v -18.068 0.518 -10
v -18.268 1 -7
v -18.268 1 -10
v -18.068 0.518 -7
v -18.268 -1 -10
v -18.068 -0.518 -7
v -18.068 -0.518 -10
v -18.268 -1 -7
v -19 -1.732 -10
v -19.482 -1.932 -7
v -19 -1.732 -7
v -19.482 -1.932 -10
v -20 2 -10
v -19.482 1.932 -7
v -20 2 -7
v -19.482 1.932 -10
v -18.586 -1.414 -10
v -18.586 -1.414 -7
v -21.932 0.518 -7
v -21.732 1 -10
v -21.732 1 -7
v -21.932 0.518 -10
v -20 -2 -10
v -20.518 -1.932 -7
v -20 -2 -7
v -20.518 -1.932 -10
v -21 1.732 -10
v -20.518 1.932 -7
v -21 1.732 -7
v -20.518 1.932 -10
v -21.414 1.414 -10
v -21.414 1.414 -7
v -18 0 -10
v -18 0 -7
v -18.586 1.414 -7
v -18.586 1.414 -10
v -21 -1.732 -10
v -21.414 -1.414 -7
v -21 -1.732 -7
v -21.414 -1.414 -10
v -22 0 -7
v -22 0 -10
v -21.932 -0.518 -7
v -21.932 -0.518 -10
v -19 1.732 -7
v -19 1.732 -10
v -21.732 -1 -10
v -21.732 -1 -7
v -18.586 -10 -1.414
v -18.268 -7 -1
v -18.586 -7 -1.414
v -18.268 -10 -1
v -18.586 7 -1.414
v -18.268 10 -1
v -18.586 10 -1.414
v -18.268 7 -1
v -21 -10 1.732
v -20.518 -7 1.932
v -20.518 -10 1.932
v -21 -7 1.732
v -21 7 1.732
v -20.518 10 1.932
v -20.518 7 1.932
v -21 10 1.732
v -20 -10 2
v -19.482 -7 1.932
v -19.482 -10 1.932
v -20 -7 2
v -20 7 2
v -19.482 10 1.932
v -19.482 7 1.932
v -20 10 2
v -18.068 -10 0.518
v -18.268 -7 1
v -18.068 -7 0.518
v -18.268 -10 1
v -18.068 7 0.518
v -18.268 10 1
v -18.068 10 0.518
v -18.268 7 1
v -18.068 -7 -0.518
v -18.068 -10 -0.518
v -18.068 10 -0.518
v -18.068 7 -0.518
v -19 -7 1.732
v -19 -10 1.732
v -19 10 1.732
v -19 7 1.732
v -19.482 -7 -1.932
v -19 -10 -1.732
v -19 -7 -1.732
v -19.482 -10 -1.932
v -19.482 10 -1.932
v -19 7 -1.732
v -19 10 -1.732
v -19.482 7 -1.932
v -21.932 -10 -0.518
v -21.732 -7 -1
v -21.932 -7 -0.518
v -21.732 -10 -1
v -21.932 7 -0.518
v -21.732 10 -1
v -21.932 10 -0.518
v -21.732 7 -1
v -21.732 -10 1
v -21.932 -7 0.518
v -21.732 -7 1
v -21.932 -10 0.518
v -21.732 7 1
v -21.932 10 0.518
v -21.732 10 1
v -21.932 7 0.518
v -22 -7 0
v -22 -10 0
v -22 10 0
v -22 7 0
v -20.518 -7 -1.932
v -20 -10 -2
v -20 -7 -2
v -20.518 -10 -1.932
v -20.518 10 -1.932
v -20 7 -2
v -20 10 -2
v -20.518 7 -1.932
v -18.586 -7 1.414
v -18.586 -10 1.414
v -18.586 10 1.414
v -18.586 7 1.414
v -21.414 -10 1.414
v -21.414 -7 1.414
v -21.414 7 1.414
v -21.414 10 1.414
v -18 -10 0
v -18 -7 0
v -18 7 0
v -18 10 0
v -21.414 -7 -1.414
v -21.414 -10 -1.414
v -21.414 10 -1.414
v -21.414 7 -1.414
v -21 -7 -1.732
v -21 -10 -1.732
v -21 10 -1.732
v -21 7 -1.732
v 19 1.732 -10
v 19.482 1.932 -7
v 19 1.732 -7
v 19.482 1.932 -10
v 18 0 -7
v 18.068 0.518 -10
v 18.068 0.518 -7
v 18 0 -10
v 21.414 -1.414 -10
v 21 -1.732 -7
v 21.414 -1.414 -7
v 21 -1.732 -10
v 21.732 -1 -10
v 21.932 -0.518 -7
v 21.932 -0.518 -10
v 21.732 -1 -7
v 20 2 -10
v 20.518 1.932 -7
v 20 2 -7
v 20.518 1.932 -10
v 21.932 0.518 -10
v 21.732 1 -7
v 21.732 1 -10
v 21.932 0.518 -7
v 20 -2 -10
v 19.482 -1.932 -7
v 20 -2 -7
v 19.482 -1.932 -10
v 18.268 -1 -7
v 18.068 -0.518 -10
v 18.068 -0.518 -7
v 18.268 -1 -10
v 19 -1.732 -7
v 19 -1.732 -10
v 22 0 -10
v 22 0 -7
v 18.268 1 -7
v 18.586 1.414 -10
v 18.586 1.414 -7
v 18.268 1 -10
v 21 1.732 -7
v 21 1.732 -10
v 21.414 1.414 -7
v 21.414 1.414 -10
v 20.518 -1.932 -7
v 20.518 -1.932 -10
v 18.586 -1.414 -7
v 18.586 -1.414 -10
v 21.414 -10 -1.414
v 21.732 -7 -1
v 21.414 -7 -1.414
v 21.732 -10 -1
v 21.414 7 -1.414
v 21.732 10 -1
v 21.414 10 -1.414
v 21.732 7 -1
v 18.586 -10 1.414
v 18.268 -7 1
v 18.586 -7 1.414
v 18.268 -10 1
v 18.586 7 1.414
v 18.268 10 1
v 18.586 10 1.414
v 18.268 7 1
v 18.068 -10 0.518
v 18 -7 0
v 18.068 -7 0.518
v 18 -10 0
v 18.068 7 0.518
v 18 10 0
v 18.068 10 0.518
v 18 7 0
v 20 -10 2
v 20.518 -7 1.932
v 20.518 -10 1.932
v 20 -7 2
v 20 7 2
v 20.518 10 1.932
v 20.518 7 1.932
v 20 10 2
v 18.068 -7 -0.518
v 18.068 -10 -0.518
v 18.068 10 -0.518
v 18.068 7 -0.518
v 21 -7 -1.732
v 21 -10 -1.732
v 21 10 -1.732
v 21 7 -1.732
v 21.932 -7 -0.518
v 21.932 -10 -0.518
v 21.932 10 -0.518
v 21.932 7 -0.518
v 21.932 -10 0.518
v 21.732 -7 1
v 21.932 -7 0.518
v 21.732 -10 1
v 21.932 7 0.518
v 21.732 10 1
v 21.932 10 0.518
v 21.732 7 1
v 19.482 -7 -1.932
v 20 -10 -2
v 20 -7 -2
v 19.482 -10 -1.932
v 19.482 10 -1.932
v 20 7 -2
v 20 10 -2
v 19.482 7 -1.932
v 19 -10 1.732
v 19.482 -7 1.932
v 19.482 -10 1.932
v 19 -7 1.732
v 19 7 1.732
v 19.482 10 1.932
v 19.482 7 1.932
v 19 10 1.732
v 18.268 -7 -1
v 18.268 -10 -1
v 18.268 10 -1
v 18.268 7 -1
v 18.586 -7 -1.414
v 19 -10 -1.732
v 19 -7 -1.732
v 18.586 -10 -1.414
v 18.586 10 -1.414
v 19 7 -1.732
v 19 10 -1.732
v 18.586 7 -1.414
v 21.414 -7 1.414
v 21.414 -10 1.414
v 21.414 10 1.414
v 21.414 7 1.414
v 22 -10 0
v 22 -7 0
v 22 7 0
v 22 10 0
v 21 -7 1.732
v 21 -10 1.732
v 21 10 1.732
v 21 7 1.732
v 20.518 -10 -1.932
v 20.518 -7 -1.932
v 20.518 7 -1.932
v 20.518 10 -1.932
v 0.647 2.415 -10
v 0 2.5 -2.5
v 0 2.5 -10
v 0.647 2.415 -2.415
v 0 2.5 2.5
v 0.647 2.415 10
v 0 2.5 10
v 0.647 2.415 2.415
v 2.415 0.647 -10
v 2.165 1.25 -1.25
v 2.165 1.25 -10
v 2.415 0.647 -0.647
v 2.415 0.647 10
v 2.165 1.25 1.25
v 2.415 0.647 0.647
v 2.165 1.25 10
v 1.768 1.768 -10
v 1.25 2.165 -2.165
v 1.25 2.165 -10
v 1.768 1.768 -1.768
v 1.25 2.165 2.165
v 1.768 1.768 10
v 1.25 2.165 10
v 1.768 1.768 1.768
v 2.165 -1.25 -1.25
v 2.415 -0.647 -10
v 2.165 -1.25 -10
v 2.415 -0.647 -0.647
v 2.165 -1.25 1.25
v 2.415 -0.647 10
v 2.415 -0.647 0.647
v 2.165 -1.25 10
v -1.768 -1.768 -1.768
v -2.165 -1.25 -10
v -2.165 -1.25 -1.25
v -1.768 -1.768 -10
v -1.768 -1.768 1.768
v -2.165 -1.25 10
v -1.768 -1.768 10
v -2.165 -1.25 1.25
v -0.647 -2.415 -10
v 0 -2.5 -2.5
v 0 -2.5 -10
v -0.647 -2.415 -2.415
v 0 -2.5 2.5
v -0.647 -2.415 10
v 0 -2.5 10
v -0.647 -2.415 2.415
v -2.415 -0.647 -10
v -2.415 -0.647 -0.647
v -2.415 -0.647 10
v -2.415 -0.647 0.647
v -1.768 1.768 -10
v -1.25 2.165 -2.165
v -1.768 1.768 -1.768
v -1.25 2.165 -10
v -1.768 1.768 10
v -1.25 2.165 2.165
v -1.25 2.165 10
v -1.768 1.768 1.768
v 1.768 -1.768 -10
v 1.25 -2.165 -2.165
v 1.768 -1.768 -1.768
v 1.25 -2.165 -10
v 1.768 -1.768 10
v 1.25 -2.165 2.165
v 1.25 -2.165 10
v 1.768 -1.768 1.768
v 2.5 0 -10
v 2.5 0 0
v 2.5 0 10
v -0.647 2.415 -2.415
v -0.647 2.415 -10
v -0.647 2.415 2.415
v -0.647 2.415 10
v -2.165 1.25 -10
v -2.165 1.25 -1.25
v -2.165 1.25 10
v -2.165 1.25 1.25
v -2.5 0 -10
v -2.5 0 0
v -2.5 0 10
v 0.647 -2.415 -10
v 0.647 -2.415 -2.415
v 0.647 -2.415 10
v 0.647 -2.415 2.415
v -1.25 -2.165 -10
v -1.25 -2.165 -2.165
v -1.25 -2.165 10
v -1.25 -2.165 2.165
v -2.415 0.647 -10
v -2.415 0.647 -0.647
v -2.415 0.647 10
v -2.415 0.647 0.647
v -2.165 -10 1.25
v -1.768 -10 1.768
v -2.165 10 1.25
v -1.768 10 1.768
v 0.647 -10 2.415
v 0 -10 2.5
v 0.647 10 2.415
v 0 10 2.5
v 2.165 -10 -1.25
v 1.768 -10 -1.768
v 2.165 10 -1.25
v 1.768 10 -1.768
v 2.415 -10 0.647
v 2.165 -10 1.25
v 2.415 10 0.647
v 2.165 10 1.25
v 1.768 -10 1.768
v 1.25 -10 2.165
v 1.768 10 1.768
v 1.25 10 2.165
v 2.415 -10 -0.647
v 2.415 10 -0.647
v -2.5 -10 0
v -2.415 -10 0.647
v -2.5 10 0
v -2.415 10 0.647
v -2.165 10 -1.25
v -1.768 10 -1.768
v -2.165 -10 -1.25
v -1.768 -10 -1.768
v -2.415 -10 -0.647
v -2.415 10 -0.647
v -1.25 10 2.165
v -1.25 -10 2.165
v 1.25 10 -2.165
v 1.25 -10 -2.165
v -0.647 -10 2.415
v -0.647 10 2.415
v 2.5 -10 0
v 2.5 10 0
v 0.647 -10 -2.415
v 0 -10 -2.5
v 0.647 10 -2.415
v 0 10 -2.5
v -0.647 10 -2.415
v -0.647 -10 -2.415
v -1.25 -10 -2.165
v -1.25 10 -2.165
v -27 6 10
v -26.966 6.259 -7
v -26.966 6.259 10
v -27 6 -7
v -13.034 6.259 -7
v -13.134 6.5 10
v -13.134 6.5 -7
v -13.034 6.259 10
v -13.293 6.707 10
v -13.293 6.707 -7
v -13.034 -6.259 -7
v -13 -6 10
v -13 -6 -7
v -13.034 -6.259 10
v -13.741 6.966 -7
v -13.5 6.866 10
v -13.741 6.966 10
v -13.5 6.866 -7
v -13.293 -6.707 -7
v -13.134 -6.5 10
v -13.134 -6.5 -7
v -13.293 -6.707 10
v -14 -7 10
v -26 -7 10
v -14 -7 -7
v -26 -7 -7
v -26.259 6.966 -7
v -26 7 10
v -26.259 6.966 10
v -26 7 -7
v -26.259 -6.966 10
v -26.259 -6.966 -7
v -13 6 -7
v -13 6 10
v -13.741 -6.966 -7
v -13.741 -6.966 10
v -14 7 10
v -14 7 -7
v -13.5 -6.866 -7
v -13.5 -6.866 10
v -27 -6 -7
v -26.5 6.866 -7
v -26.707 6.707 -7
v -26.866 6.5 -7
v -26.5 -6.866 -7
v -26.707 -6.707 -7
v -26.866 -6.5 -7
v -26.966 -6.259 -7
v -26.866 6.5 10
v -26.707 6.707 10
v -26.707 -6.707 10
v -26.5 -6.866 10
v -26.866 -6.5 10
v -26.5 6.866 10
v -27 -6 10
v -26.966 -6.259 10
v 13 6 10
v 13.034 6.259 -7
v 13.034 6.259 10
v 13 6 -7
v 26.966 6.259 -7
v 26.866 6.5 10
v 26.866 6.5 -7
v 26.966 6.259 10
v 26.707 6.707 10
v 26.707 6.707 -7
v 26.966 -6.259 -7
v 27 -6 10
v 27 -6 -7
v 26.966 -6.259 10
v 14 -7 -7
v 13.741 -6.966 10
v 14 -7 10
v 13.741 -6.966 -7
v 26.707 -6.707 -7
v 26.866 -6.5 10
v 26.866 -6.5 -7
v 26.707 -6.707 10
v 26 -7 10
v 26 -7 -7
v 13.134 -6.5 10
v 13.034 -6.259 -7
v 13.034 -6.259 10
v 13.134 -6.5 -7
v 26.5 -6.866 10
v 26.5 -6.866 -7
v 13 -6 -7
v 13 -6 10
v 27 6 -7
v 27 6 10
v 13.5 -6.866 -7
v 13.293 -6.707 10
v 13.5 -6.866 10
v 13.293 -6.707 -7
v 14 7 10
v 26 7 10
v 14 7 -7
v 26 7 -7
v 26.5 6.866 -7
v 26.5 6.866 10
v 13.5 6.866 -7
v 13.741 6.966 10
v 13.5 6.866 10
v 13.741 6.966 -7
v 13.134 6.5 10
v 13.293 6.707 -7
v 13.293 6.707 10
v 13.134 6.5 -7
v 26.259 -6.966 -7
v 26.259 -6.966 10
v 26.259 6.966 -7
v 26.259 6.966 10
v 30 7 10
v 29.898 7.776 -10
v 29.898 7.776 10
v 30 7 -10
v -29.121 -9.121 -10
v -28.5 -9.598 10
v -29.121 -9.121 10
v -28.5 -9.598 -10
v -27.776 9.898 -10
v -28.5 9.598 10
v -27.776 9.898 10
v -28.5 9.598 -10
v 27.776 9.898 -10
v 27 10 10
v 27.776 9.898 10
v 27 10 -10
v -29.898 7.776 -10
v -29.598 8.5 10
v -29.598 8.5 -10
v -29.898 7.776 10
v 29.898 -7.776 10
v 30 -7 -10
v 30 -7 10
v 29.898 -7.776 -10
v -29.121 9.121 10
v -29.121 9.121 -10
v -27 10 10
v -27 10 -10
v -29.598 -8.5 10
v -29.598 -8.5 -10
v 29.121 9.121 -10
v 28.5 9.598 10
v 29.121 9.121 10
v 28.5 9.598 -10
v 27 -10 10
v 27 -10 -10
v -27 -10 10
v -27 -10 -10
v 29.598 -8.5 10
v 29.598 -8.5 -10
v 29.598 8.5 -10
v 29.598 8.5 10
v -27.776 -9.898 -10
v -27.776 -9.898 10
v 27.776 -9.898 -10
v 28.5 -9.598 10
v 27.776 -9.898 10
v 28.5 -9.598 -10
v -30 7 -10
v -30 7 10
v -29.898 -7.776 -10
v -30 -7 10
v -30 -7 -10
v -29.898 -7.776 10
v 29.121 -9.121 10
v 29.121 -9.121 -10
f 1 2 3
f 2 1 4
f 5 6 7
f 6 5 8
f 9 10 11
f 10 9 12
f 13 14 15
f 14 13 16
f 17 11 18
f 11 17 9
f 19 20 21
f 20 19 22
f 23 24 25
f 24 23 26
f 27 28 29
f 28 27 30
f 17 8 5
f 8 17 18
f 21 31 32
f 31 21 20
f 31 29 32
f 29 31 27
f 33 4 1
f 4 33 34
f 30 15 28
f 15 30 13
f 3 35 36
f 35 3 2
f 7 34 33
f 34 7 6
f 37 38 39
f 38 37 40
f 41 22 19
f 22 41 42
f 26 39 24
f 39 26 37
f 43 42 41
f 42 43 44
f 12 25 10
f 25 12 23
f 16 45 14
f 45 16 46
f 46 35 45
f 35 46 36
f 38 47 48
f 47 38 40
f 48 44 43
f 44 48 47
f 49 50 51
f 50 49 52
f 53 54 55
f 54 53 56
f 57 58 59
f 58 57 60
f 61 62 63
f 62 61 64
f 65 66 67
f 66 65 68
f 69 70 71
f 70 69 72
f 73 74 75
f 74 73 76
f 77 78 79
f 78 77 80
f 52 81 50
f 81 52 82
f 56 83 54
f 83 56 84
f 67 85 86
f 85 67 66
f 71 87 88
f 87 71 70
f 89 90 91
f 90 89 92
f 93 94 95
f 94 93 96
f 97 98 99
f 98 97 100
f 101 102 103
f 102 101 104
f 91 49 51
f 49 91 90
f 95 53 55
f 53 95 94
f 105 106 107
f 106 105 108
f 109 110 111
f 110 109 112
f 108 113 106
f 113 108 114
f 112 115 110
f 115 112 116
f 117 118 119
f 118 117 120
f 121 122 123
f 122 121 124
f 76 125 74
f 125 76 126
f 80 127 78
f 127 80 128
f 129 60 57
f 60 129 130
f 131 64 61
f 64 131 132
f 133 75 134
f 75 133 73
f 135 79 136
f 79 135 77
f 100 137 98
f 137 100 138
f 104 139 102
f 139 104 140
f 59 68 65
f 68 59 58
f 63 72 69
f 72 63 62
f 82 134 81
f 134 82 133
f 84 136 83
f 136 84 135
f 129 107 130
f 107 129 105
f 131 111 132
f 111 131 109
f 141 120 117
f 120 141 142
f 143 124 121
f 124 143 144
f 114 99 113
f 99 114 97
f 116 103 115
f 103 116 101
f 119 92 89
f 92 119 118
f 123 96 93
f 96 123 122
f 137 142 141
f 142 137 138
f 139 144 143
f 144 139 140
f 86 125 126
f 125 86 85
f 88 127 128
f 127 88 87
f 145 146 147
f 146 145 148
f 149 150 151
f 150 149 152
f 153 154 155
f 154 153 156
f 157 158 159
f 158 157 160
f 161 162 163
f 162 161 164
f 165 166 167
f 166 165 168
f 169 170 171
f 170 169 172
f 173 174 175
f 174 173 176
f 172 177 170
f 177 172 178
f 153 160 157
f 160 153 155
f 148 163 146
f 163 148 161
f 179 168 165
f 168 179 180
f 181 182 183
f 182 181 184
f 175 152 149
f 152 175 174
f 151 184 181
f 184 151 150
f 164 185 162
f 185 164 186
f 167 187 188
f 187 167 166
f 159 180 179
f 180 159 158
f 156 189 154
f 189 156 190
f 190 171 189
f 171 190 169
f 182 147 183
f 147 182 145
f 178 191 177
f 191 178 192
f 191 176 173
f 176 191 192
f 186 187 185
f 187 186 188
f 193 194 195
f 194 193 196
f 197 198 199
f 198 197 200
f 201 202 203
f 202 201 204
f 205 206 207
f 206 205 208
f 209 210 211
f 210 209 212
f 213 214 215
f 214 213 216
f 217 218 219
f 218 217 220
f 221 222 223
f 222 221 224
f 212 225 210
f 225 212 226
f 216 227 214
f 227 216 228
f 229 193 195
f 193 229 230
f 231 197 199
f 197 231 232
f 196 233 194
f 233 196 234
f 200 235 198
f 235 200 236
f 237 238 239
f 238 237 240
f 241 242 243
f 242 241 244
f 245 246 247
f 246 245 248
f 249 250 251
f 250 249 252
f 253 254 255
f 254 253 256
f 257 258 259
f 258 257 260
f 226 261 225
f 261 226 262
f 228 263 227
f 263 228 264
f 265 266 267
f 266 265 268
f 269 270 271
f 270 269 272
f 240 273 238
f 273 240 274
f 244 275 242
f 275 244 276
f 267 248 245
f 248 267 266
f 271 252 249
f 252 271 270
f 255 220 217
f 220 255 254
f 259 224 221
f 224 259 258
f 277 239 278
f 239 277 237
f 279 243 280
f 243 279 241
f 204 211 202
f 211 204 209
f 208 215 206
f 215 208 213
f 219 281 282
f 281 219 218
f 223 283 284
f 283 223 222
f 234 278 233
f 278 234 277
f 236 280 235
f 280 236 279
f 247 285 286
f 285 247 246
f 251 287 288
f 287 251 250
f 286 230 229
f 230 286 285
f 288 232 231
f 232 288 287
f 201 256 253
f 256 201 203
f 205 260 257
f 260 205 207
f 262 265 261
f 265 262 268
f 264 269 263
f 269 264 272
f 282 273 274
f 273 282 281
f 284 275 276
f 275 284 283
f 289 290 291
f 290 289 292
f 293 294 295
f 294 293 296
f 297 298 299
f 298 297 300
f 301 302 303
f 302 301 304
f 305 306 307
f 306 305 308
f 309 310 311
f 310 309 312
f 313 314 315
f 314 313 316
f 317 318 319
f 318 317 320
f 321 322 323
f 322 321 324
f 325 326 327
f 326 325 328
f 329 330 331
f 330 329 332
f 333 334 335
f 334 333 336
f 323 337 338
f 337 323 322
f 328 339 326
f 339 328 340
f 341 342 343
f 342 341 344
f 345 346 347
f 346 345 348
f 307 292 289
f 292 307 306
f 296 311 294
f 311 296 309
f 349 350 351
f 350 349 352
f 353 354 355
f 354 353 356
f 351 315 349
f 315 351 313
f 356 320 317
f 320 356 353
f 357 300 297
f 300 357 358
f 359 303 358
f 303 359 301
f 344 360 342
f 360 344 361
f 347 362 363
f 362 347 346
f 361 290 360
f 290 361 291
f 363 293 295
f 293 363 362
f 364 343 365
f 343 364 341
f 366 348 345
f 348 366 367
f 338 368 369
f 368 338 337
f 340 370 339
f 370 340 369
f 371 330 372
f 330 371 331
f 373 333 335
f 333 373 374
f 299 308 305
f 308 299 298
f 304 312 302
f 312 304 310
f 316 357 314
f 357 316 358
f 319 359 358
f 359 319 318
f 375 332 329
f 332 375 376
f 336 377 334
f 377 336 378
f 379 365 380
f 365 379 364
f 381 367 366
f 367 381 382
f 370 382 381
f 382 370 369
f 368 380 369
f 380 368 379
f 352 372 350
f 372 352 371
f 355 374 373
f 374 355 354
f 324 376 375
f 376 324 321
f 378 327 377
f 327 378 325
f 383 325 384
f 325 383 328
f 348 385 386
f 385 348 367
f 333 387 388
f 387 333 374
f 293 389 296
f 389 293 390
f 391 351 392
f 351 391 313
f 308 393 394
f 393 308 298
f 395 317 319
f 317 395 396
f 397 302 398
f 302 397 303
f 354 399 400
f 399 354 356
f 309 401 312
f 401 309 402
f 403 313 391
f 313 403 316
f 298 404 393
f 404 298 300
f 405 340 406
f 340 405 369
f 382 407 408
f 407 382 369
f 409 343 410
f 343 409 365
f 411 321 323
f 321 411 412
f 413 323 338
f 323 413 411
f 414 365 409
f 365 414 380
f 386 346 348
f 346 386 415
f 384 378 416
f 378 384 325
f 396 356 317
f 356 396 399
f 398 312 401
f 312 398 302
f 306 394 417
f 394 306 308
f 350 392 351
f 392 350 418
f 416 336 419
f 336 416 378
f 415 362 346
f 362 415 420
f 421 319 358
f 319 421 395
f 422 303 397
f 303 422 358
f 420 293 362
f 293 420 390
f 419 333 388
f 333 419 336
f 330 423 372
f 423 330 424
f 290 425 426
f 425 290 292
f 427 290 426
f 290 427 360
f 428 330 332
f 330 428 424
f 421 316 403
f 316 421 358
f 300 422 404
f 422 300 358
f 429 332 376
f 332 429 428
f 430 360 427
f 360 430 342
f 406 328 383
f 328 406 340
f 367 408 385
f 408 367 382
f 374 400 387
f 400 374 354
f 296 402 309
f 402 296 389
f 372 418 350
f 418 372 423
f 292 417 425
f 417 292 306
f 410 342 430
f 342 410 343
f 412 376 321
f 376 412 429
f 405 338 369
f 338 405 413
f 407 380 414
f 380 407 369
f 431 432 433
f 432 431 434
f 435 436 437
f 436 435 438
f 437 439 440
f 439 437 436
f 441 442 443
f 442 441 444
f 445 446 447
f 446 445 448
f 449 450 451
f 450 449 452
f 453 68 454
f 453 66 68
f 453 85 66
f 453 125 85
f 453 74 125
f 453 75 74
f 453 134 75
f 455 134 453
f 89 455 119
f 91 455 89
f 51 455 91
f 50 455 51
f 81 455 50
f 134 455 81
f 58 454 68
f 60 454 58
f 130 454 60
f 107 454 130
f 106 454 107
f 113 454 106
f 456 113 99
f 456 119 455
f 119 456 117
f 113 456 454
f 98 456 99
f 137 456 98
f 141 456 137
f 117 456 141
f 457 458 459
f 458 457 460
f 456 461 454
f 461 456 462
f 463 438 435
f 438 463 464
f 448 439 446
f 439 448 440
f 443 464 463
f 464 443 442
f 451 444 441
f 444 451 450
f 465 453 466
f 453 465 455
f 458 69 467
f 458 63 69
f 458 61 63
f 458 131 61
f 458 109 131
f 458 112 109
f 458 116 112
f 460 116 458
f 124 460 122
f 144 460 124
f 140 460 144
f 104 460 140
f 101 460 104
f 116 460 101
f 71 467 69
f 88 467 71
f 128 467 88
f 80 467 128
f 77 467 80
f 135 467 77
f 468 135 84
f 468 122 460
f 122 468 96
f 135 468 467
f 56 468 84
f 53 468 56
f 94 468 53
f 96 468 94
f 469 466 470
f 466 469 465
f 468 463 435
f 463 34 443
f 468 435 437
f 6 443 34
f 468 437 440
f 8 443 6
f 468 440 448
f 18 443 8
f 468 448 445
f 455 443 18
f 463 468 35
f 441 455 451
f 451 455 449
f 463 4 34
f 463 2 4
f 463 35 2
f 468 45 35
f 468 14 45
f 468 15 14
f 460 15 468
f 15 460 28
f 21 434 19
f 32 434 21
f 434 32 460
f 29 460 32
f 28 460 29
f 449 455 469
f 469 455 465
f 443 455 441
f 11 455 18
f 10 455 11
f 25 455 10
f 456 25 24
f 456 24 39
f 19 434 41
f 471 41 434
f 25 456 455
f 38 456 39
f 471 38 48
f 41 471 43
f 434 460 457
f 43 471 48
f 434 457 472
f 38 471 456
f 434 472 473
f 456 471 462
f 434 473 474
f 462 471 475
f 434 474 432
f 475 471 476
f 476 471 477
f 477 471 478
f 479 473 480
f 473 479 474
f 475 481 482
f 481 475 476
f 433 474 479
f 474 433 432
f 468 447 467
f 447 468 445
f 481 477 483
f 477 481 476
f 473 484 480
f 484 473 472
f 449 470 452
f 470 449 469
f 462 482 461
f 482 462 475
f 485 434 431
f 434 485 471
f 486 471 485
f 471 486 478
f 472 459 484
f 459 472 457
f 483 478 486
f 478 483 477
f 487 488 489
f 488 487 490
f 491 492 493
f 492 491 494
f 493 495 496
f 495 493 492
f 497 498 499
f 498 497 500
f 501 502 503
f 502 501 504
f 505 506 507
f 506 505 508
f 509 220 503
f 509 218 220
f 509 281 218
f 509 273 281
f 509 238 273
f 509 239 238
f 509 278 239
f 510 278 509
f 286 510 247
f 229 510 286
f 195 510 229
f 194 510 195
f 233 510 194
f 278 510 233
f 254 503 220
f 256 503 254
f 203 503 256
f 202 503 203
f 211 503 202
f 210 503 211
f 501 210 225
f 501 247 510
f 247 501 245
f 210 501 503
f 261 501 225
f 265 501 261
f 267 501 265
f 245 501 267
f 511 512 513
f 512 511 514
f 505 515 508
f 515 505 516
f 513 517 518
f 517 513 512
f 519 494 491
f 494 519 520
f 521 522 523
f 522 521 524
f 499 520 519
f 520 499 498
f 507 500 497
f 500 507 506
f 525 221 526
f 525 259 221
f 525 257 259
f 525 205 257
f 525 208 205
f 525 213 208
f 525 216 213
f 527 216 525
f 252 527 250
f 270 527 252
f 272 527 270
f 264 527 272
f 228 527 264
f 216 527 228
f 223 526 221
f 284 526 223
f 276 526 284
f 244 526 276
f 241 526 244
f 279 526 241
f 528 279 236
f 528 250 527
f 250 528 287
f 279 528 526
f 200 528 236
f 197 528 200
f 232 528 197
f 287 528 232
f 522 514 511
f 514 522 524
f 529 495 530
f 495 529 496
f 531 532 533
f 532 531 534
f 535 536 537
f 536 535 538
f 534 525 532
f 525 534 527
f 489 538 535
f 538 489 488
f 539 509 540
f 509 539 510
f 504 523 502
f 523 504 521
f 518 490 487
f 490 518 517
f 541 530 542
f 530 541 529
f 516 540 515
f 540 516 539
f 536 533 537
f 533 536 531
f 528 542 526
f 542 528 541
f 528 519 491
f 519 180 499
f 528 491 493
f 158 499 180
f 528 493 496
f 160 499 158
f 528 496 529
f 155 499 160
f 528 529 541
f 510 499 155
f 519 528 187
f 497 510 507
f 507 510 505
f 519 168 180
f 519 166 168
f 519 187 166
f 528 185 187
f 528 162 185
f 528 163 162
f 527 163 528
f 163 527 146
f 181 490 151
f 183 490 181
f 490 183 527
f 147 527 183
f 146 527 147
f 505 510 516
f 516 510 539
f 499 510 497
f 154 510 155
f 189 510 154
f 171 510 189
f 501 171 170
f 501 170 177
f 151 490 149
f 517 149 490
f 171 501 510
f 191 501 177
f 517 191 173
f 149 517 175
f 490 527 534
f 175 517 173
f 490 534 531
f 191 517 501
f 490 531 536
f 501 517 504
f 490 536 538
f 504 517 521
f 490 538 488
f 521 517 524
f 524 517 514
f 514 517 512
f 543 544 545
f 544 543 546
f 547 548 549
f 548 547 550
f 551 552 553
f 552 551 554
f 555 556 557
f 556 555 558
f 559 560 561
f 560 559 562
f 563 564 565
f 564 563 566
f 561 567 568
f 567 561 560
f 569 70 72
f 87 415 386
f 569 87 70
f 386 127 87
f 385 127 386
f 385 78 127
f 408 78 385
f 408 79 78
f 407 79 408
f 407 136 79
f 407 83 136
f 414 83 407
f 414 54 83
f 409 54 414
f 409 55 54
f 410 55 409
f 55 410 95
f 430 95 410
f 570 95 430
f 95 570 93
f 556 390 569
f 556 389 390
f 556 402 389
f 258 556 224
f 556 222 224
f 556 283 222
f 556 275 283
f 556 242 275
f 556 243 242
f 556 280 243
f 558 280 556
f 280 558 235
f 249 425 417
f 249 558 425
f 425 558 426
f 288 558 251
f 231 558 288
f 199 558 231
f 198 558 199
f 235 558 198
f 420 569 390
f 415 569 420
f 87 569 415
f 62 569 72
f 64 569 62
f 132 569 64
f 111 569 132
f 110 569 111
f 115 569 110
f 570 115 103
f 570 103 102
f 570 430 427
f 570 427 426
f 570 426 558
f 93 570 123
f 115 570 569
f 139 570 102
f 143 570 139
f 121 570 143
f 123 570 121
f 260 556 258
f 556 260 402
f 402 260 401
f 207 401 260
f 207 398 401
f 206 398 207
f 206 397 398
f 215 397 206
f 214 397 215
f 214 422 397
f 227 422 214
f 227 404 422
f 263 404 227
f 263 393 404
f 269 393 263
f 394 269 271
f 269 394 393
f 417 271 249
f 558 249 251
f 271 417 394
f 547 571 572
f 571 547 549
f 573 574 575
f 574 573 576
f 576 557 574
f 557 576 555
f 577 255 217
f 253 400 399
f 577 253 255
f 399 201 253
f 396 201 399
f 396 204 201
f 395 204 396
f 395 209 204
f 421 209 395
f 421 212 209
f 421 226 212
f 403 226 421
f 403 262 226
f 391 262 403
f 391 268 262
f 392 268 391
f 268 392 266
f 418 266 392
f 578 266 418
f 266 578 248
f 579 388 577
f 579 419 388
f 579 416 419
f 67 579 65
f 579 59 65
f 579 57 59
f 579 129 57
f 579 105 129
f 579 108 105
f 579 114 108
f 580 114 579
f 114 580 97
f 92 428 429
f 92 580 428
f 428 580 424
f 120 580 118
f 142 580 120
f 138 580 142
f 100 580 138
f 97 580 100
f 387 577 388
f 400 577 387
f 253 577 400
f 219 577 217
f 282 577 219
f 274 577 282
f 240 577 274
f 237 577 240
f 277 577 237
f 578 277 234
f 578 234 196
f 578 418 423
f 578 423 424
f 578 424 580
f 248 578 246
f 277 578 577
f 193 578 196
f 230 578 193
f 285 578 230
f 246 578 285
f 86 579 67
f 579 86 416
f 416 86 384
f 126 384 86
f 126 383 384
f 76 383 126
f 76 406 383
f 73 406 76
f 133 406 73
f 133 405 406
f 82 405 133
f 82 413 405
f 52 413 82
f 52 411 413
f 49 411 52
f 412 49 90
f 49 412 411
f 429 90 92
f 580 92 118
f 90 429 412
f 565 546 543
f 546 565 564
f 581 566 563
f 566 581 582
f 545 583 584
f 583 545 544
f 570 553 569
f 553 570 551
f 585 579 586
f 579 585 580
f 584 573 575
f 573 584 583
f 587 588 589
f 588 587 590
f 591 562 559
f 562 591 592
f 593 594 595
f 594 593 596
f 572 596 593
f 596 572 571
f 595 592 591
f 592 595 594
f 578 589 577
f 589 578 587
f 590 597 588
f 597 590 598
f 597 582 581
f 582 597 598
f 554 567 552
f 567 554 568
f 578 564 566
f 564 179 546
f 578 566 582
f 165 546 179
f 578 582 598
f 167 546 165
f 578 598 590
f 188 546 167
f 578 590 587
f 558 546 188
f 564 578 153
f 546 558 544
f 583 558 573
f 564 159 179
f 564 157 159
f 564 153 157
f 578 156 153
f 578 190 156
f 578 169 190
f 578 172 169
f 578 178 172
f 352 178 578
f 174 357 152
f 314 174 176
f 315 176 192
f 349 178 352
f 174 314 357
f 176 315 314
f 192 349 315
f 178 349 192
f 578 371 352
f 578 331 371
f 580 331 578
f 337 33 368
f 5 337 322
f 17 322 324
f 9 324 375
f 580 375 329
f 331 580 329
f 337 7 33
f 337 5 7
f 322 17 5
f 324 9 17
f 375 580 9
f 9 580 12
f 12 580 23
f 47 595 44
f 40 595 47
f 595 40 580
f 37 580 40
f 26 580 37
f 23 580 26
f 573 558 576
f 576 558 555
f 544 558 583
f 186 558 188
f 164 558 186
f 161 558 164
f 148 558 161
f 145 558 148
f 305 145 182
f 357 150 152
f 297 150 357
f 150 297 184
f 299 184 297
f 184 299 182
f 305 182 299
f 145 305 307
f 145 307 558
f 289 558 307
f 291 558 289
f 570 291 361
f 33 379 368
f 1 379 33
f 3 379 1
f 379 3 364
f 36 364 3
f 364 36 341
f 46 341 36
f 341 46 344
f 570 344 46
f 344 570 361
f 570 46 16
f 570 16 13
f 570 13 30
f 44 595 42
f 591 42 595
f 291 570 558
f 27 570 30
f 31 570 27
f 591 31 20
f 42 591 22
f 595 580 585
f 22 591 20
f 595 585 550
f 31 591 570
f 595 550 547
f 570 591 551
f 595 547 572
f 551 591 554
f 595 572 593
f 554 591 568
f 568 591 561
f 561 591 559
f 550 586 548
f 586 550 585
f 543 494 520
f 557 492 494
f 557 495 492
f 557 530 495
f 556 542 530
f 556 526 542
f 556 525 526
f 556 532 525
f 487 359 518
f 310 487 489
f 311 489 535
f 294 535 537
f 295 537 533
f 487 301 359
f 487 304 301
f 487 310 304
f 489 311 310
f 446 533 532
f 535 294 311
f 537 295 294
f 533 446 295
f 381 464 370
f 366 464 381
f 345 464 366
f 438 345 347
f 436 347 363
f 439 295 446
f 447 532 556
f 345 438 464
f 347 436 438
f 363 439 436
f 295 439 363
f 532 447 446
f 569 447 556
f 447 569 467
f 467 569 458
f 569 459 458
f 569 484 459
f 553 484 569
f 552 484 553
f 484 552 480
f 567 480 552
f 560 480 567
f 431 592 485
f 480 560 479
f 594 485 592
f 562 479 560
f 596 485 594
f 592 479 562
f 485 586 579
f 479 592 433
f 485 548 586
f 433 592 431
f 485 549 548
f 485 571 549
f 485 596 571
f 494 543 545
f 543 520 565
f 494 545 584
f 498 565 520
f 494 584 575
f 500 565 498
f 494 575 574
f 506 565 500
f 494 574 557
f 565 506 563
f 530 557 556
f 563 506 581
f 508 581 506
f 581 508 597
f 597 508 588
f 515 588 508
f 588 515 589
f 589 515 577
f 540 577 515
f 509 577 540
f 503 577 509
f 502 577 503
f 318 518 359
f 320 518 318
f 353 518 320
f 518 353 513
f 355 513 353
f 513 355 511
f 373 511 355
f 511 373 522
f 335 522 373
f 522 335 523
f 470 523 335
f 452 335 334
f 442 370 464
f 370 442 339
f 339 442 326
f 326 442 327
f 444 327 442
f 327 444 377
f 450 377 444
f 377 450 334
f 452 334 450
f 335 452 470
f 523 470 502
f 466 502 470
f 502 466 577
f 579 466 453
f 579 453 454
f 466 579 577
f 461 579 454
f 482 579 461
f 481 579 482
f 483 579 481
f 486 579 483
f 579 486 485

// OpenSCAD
// file: ../lib/TOGMod1Constructors.scad
// TOGMod1Constructors-v1.6
// 
// Functions to construct objects understood by TOGMod1
// 
// v1.1:
// - Add togmod1_make_rounded_rect
// v1.2:
// - togmod1_make_rounded_rect can make ovals
// v1.3:
// - togmod1_circle_points, to just get the points of a circle
// - if pos parameter to circle function has a third element,
//   returned vertexes will include it as the z component;
// v1.3.1
// - Some assertions
// v1.4:
// - Refactor togmod1_rounded_rect_points and togmod1_circle_points
//   to use togmod1__make_nd_vector_adder for adapting to whatever
//   `pos` parameter is.
// v1.5:
// - togmod_rounded_rect_points will not simplify completely rounded sides
//   (where length of side is exactly twice the rounding radius)
//   unless simplify_rounded_sides=true
//   - This makes it more useful for polyhedron generation,
//     where radius varies, but number of points must remain constant.
// v1.6:
// - togmod1_make_rect makes a simple rectangle
// - togmod1_make_rounded_rect will defer to togmod1_make_rect when r=0

use <./TOGArrayLib1.scad>

function togmod1__make_nd_vector_adder(origin=[0,0]) =
	let(origin_is_zero = tal1_reduce(true, origin, function(prev,item) prev && item == 0))
	origin_is_zero ? (function(vec) len(vec) >= len(origin) ? vec : tal1_replace_at(origin, 0, vec)) :
	function(vec) [
		for(i=[0:1:max(len(origin),len(vec))-1]) (len(vec) > i ? vec[i] : 0) + (len(origin) > i ? origin[i] : 0),
	];

assert([1,2,3] == togmod1__make_nd_vector_adder()([1,2,3]));
echo(togmod1__make_nd_vector_adder([0,0,3])([1,2]));
assert([1,2,3] == togmod1__make_nd_vector_adder([0,0,3])([1,2]));


function togmod1_make_cuboid(size) =
	assert(is_list(size))
	assert(len(size) >= 3)
	assert(is_num(size[0]))
	assert(is_num(size[1]))
	assert(is_num(size[2]))
	["polyhedron-vf", [
		[-size[0]/2, -size[1]/2, -size[2]/2],
		[+size[0]/2, -size[1]/2, -size[2]/2],
		[-size[0]/2, +size[1]/2, -size[2]/2],
		[+size[0]/2, +size[1]/2, -size[2]/2],
		[-size[0]/2, -size[1]/2, +size[2]/2],
		[+size[0]/2, -size[1]/2, +size[2]/2],
		[-size[0]/2, +size[1]/2, +size[2]/2],
		[+size[0]/2, +size[1]/2, +size[2]/2]
	], [
		[0,1,3,2],[0,4,5,1],[4,6,7,5],[3,7,6,2],[1,5,7,3],[6,4,0,2]
	]];

function togmod1_make_polygon(verts) =
	["polygon-vp", verts, [[for( i=[0:1:len(verts)-1] ) i%len(verts)]]];

function togmod1_rounded_rect_points(size, r, pos=[0,0], simplify_rounded_sides=false) =
	assert(is_list(size))
	assert(len(size) >= 2)
	let(radii = is_list(r) ? r : is_num(r) ? [r,r] : assert(false, "rounded_rect r(adius) should be list<num> or num"))
	let(rx = radii[0])
	let(ry = radii[1])
	assert(is_num(rx))
	assert(is_num(ry))
	assert(size[0] >= 2*rx, str("size[0] must be >= 2*r[0]; size[0] = ",size[0],", 2*r[0] = ",2*rx))
	assert(size[1] >= 2*ry, str("size[1] must be >= 2*r[1]; size[1] = ",size[1],", 2*r[1] = ",2*ry))
	let(quarterfn=max($fn/4, 1))
	let(qfnx = simplify_rounded_sides && size[0] == 2*rx ? quarterfn-1 : quarterfn)
	let(qfny = simplify_rounded_sides && size[1] == 2*ry ? quarterfn-1 : quarterfn)
	let(finalizepos = togmod1__make_nd_vector_adder(pos))
[
	for(a=[0 : 1 : qfnx]) let(ang=      a*90/quarterfn) finalizepos([ size[0]/2-rx + rx*cos(ang),  size[1]/2-ry + ry*sin(ang)]),
	for(a=[0 : 1 : qfny]) let(ang= 90 + a*90/quarterfn) finalizepos([-size[0]/2+rx + rx*cos(ang),  size[1]/2-ry + ry*sin(ang)]),
	for(a=[0 : 1 : qfnx]) let(ang=180 + a*90/quarterfn) finalizepos([-size[0]/2+rx + rx*cos(ang), -size[1]/2+ry + ry*sin(ang)]),
	for(a=[0 : 1 : qfny]) let(ang=270 + a*90/quarterfn) finalizepos([ size[0]/2-rx + rx*cos(ang), -size[1]/2+ry + ry*sin(ang)]),
];

function togmod1_make_rect(size) =
	togmod1_make_polygon([
		[-size[0]/2, -size[1]/2],
		[+size[0]/2, -size[1]/2],
		[+size[0]/2, +size[1]/2],
		[-size[0]/2, +size[1]/2],
	]);

function togmod1_make_rounded_rect(size, r) =
	r == 0 ? togmod1_make_rect(size) :
	togmod1_make_polygon(togmod1_rounded_rect_points(size,r,simplify_rounded_sides=true));

function togmod1_circle_points(r, pos=[0,0], d=undef) =
	assert( !is_undef(r) || !is_undef(d) )
	assert(!is_undef(pos[0]))
	assert(!is_undef(pos[1]))
	let(finalizepos = togmod1__make_nd_vector_adder(pos))
	let(r_ = !is_undef(r) ? r : d/2)
	let(fn = max($fn, 6))
	[for(i=[0 : 1 : fn-1]) finalizepos([r_*cos(i*360/fn), r_*sin(i*360/fn)])];

function togmod1_make_circle(r, pos=[0,0], d=undef) =
	togmod1_make_polygon(togmod1_circle_points(r=r, pos=pos, d=d));

function togmod1_make_cylinder(d, zrange=[0,1], r=undef, pos=[0,0]) =
	assert( !is_undef(r) || !is_undef(d) )
	let( r_ = !is_undef(r) ? r : d/2 )
	// TODO: Make polyhedron directly
	["linear-extrude-zs", zrange, togmod1_make_circle(r=r_, pos=pos)];

function togmod1__is_range1d(range) = is_list(range) && len(range) == 2 && is_num(range[0]) && is_num(range[1]);

function togmod1_linear_extrude_z(range, shape) =
	assert(togmod1__is_range1d(range))
	["linear-extrude-zs", range, shape];
function togmod1_linear_extrude_x(range, shape) =
	assert(togmod1__is_range1d(range))
	["rotate", [90, 0, 90], togmod1_linear_extrude_z(range, shape)];
function togmod1_linear_extrude_y(range, shape) =
	assert(togmod1__is_range1d(range))
	["rotate", [90, 0, 180], togmod1_linear_extrude_z(range, shape)];
// file: ../lib/TOGArrayLib1.scad
// TOGArrayLib1.4
// 
// Functions for working with arrays.
// 
// v1.1:
// - tal1_reduce assert(is_list(items)) to prevent infinite recursion
//   when given undefined or other non-list values
// v1.1.1:
// - Fix tal1_uniq_remap_v2 to return "list-remap-result" as the
//   first element of the returned list
// v1.2:
// - Add tal1_replace_at function
// v1.3:
// - tal1_is_vec_of, tal1_is_vec_of_num
// v1.4:
// - tal1_assert_for_each, for when you want to assert something
//   about each of a list of items and get nice failure messages

/**
 * Make a list with the contents of list `a`,
 * but starting at offset `off`, replaced by the contents of list `b`.
 * len(result) = max(len(a), off+len(b))
 */
function tal1_replace_at(a, off, b, default_value=undef, default_value_function=undef) =
	assert(is_list(a))
	assert(is_list(b))
	let( _dvf = !is_undef(default_value_function) ? default_value_function : function(i) default_value )
[
	for( i=[0:1:min(off,len(a))-1] ) a[i],
	for( i=[len(a):1:off-1] ) _dvf(i),
	for( i=[off:1:off+len(b)-1] ) b[i-off],
	for( i=[off+len(b):1:len(a)-1] ) a[i],
];

// Simplest case
assert([] == tal1_replace_at([], 0, []));
// Second simplest cases
assert(["foo"] == tal1_replace_at(["foo"], 0, []));
assert(["foo"] == tal1_replace_at([], 0, ["foo"]));
// Replace one item
assert(["foo","quux","baz"] == tal1_replace_at(["foo","bar","baz"], 1, ["quux"]));
// Replace and extend
assert(["foo","quux","tuna","tina"] == tal1_replace_at(["foo","bar","baz"], 1, ["quux", "tuna", "tina"]));
// Add beyond end of `a`
assert(["foo","zzz","quux"] == tal1_replace_at(["foo"], 2, ["quux"], default_value="zzz"));
// Adding 'nothing' should still fill to that point with defaults
assert(["foo","zzz","zzz"] == tal1_replace_at(["foo"], 3, [], default_value="zzz"));


function tal1_reduce(start, items, func, offset=0) =
	assert(is_list(items))
	len(items) == offset ? start :
	tal1_reduce(func(start, items[offset]), items, func, offset+1);

function tal1_consecutive_duplicate_count(items) = tal1_reduce(
	[0, undef],
	items,
	function(z,item) [z[0] + (item == z[1] ? 1 : 0), item]
)[0];

assert(0 == tal1_consecutive_duplicate_count([]));
assert(0 == tal1_consecutive_duplicate_count([50]));
assert(1 == tal1_consecutive_duplicate_count([50,50]));
assert(0 == tal1_consecutive_duplicate_count([50,51,52,53]));
assert(1 == tal1_consecutive_duplicate_count([50,51,52,52]));
assert(3 == tal1_consecutive_duplicate_count([50,50,50,50]));

// Set test_size to arbirarily large values
// to ensure that OpenSCAD can handle heavy recursion
let(test_size=1000) assert(test_size/2 == tal1_consecutive_duplicate_count([for(i=[0:1:test_size-1]) floor(i/2)]));



function tal1_uniq_(items, off0, off1) =
	let(chunklen = off1-off0)
	chunklen == 0 ? [] :
	chunklen == 1 ? [items[off0]] :
	let(half=floor(chunklen/2))
	let(left  = tal1_uniq_(items, off0     , off0+half))
	let(right = tal1_uniq_(items, off0+half, off1     ))
	assert(len(left) > 0)
	assert(len(right) > 0)
	left[len(left)-1] == right[0] ? [each left, for(i=[1:1:len(right)-1]) right[i]] :
	[each left, each right];

/** Given a list of items, returns a new list with identical consecutive items merged */
function tal1_uniq(items) = tal1_uniq_(items, 0, len(items));

assert([] == tal1_uniq([]));
assert([123] == tal1_uniq([123]));
assert([55,0,1,2,3] == tal1_uniq([55,0,1,2,3]));
assert([55,0,1,2] == tal1_uniq([55,0,1,1,2]));
assert([55,0,1] == tal1_uniq([55,55,0,0,0,0,0,0,1,1,1,1]));
assert([55,0] == tal1_uniq([55,0,0,0,0,0,0,0]));



/**
 * Returns [new items, old index -> new index mapping].
 * No-op version.
 */
function tal1_uniq_remap_v1(items) =
	["list-remap-result", items, [for (vi=[0:1:len(items)-1]) vi]];

// [a, a, b, b, c, c]
//
// [a,    ...], []  -> [a],[0]
// [a, a, ...], [0] -> [a],[0,0]

assert([1,2,3] == [1,2,3]);

/**
 * Recursive version that will combine adjacent identical vertexes,
 * but will use the original items.
 */
function tal1_uniq_remap_v2(items, map=[]) =
	let(index = len(map))
	len(items) == index ? ["list-remap-result", items, map] :
	index == 0 ? tal1_uniq_remap_v2(items, [0]) :
	items[index] == items[map[index-1]] ? tal1_uniq_remap_v2(items, [for(vi=map) vi, map[index-1]]) :
	tal1_uniq_remap_v2(items, [for(vi=map) vi, index]);

assert(tal1_uniq_remap_v2([1,1,2,2,3,4]) == ["list-remap-result", [1,1,2,2,3,4], [0,0,2,2,4,5]]);


/**
 * Returns true if `vec` is a list of at least min_len items
 * and component_check(each item, even those beyond min_len) is true.
 */
function tal1_is_vec_of(vec, min_len=0, component_check=function(x) true) =
	assert(is_num(min_len) && min_len >= 0)
	assert(is_function(component_check))
	is_list(vec) && len(vec) >= min_len &&
	tal1_reduce(true, vec, function(prev,item) prev && component_check(item));

function tal1_is_vec_of_num(vec, min_len=0) = tal1_is_vec_of(vec, min_len, function(i) is_num(i));

assert( true == tal1_is_vec_of_num([1,2,3]));
assert( true == tal1_is_vec_of_num([]));
assert( true == tal1_is_vec_of_num([1,2,3], 3));
assert(false == tal1_is_vec_of_num([1,2], 3));
assert(false == tal1_is_vec_of_num([1,2,"spoon"], 3));
// Requirements are ambiguous when
// first min_len items are numbers, but there are non-numeric items afterwards,
// so let's error on the side of saying 'no, it's not a list of numbers';
// i.e. the item check and the min_len are independent.
assert(false == tal1_is_vec_of_num([1,2,3,"artichoke"], 3));


/**
 * Asserts that item_checker(each item in list, index of item)[0] is true.
 * Second element of item_checker return value is assertion message.
 * Returns the original list, in case that's useful to you.
 */
function tal1_assert_for_each(list, item_checker) =
	let( _ignored = [ for(i=[0:1:len(list)-1])
		let(q=item_checker(list[i],i))
		let(passed=is_bool(q) ? q : is_list(q) ? q[0] : assert(false, str(
			"tal1_assert_for_each: item_checker should return Bool|[Bool,String], but returned ",
			q, " for item at index ", i)))
		let(message=is_list(q) ? q[1] : undef)
		assert(passed, message)
		q
	])
	list;

// Callback can return a boolean...
assert([1,2,3] == tal1_assert_for_each([1,2,3], function(v,i) is_num(v)));
// ...or a [boolean, string]
assert([1,2,3] == tal1_assert_for_each([1,2,3], function(v,i) [is_num(v), "element be a num"]));
// file: ../lib/TOGMod1.scad
// TOGMod1
// OpenSCAD library for representing shapes
// 
// See also: Functional OpenSCAD (https://github.com/thehans/FunctionalOpenSCAD)

module togmod1_domodule(mod) {
	assert(is_list(mod));
	assert(len(mod) > 0);
	if( mod[0] == "polygon-vp" ) {
		// ["polygon-vp", vertexes, paths]
		polygon(points=mod[1], paths=mod[2]);
	} else if( mod[0] == "polyhedron-vf" ) {
		polyhedron(mod[1], faces=mod[2]);
	} else if( mod[0] == "scale" ) {
		assert(len(mod) == 3);
		scale(mod[1]) togmod1_domodule(mod[2]);
	} else if( mod[0] == "translate" ) {
		assert(len(mod) == 3);
		assert(is_list(mod[1]));
		for(c=mod[1]) assert(is_num(c), "translate component should be numeric");
		translate(mod[1]) togmod1_domodule(mod[2]);
	} else if( mod[0] == "rotate" ) {
		assert(len(mod) == 3);
		rotate(mod[1]) togmod1_domodule(mod[2]);
	} else if( mod[0] == "intersection" ) {
		intersection_for( i=[1:1:len(mod)-1] ) togmod1_domodule(mod[i]);
	} else if( mod[0] == "difference" ) {
		difference() {
			togmod1_domodule(mod[1]);
			for( i=[2:1:len(mod)-1] ) togmod1_domodule(mod[i]);
		}
	} else if( mod[0] == "union" ) {
		for( i=[1:1:len(mod)-1] ) togmod1_domodule(mod[i]);
	} else if( mod[0] == "hull" ) {
		hull() for( i=[1:1:len(mod)-1] ) togmod1_domodule(mod[i]);
	} else if( mod[0] == "offset-rs" ) {
		assert(len(mod) == 3);
		assert(is_num(mod[1]));
		assert(is_list(mod[2]));
		offset(mod[1]) togmod1_domodule(mod[2]);
	} else if( mod[0] == "linear-extrude-zs" ) {
		// ["linear-extrude-zs", [z0,z1], 2d_shape] // centered
		// ["linear-extrude-zs", height, 2d_shape]
		let( zrange = is_list(mod[1]) ? mod[1] : [-mod[1]/2, mod[1]/2] ) {
			translate([0,0,zrange[0]]) linear_extrude(zrange[1]-zrange[0]) togmod1_domodule(mod[2]);
		}
	} else if( mod[0] == "render" ) {
		render() togmod1_domodule(mod[1]);
	} else if( mod[0] == "minkowski" ) {
		minkowski() {
			togmod1_domodule(mod[1]);
			togmod1_domodule(mod[2]);
		}
	} else if( mod[0] == "x-debug" ) {
		# togmod1_domodule(mod[1]);
	} else {
		assert(false, str("Unrecognized shape: ", mod[0]));
	}
}
// main file
// Schonk3.0
// 
// A gridbeam-like beam with three sections,
// where alternating sections are mostly cut out.

chunk_pitch = 20;
regular_hole_diameter = 4;
bulk_hole_diameter = 5;
$fn = 24;

use <../lib/TOGMod1.scad>
use <../lib/TOGPolyhedronLib1.scad>

function schonk3_make_schonk(
	chunk_pitch = 20,
	regular_hole_diameter = 5,
	bulk_hole_diameter = 5,
	wall_thickness = 3,
) =
let( regular_hole = tphl1_make_z_cylinder(zrange=[-chunk_pitch, chunk_pitch], d=regular_hole_diameter) )
let(    bulk_hole = tphl1_make_z_cylinder(zrange=[-chunk_pitch, chunk_pitch], d=   bulk_hole_diameter) )
let( xy_r = min(3,chunk_pitch/4) )
let( wt = wall_thickness )
let( inner_xy_r = max(1, xy_r-wt) )
let( box_cutout = tphl1_make_rounded_cuboid([chunk_pitch-wt*2, chunk_pitch-wt*2, chunk_pitch*2-wt*2], r=[inner_xy_r, inner_xy_r, 0]) )
["difference",
	tphl1_make_rounded_cuboid([3,1,1] * chunk_pitch, r=[xy_r, xy_r, 0]),
	
	for( cx=[-1,1] ) for( r=[0,90] ) ["translate", [cx*chunk_pitch,0,0], ["rotate", [r,0,0], regular_hole]],
	for( cx=[ 0  ] ) for( r=[0,90] ) ["translate", [cx*chunk_pitch,0,0], ["rotate", [r,0,0], bulk_hole]],
	for( cx=[-1,1] ) ["translate", [cx*chunk_pitch,0,chunk_pitch/2], box_cutout],
];

togmod1_domodule(schonk3_make_schonk(
	chunk_pitch = chunk_pitch,
	regular_hole_diameter = regular_hole_diameter,
	bulk_hole_diameter = bulk_hole_diameter
));
